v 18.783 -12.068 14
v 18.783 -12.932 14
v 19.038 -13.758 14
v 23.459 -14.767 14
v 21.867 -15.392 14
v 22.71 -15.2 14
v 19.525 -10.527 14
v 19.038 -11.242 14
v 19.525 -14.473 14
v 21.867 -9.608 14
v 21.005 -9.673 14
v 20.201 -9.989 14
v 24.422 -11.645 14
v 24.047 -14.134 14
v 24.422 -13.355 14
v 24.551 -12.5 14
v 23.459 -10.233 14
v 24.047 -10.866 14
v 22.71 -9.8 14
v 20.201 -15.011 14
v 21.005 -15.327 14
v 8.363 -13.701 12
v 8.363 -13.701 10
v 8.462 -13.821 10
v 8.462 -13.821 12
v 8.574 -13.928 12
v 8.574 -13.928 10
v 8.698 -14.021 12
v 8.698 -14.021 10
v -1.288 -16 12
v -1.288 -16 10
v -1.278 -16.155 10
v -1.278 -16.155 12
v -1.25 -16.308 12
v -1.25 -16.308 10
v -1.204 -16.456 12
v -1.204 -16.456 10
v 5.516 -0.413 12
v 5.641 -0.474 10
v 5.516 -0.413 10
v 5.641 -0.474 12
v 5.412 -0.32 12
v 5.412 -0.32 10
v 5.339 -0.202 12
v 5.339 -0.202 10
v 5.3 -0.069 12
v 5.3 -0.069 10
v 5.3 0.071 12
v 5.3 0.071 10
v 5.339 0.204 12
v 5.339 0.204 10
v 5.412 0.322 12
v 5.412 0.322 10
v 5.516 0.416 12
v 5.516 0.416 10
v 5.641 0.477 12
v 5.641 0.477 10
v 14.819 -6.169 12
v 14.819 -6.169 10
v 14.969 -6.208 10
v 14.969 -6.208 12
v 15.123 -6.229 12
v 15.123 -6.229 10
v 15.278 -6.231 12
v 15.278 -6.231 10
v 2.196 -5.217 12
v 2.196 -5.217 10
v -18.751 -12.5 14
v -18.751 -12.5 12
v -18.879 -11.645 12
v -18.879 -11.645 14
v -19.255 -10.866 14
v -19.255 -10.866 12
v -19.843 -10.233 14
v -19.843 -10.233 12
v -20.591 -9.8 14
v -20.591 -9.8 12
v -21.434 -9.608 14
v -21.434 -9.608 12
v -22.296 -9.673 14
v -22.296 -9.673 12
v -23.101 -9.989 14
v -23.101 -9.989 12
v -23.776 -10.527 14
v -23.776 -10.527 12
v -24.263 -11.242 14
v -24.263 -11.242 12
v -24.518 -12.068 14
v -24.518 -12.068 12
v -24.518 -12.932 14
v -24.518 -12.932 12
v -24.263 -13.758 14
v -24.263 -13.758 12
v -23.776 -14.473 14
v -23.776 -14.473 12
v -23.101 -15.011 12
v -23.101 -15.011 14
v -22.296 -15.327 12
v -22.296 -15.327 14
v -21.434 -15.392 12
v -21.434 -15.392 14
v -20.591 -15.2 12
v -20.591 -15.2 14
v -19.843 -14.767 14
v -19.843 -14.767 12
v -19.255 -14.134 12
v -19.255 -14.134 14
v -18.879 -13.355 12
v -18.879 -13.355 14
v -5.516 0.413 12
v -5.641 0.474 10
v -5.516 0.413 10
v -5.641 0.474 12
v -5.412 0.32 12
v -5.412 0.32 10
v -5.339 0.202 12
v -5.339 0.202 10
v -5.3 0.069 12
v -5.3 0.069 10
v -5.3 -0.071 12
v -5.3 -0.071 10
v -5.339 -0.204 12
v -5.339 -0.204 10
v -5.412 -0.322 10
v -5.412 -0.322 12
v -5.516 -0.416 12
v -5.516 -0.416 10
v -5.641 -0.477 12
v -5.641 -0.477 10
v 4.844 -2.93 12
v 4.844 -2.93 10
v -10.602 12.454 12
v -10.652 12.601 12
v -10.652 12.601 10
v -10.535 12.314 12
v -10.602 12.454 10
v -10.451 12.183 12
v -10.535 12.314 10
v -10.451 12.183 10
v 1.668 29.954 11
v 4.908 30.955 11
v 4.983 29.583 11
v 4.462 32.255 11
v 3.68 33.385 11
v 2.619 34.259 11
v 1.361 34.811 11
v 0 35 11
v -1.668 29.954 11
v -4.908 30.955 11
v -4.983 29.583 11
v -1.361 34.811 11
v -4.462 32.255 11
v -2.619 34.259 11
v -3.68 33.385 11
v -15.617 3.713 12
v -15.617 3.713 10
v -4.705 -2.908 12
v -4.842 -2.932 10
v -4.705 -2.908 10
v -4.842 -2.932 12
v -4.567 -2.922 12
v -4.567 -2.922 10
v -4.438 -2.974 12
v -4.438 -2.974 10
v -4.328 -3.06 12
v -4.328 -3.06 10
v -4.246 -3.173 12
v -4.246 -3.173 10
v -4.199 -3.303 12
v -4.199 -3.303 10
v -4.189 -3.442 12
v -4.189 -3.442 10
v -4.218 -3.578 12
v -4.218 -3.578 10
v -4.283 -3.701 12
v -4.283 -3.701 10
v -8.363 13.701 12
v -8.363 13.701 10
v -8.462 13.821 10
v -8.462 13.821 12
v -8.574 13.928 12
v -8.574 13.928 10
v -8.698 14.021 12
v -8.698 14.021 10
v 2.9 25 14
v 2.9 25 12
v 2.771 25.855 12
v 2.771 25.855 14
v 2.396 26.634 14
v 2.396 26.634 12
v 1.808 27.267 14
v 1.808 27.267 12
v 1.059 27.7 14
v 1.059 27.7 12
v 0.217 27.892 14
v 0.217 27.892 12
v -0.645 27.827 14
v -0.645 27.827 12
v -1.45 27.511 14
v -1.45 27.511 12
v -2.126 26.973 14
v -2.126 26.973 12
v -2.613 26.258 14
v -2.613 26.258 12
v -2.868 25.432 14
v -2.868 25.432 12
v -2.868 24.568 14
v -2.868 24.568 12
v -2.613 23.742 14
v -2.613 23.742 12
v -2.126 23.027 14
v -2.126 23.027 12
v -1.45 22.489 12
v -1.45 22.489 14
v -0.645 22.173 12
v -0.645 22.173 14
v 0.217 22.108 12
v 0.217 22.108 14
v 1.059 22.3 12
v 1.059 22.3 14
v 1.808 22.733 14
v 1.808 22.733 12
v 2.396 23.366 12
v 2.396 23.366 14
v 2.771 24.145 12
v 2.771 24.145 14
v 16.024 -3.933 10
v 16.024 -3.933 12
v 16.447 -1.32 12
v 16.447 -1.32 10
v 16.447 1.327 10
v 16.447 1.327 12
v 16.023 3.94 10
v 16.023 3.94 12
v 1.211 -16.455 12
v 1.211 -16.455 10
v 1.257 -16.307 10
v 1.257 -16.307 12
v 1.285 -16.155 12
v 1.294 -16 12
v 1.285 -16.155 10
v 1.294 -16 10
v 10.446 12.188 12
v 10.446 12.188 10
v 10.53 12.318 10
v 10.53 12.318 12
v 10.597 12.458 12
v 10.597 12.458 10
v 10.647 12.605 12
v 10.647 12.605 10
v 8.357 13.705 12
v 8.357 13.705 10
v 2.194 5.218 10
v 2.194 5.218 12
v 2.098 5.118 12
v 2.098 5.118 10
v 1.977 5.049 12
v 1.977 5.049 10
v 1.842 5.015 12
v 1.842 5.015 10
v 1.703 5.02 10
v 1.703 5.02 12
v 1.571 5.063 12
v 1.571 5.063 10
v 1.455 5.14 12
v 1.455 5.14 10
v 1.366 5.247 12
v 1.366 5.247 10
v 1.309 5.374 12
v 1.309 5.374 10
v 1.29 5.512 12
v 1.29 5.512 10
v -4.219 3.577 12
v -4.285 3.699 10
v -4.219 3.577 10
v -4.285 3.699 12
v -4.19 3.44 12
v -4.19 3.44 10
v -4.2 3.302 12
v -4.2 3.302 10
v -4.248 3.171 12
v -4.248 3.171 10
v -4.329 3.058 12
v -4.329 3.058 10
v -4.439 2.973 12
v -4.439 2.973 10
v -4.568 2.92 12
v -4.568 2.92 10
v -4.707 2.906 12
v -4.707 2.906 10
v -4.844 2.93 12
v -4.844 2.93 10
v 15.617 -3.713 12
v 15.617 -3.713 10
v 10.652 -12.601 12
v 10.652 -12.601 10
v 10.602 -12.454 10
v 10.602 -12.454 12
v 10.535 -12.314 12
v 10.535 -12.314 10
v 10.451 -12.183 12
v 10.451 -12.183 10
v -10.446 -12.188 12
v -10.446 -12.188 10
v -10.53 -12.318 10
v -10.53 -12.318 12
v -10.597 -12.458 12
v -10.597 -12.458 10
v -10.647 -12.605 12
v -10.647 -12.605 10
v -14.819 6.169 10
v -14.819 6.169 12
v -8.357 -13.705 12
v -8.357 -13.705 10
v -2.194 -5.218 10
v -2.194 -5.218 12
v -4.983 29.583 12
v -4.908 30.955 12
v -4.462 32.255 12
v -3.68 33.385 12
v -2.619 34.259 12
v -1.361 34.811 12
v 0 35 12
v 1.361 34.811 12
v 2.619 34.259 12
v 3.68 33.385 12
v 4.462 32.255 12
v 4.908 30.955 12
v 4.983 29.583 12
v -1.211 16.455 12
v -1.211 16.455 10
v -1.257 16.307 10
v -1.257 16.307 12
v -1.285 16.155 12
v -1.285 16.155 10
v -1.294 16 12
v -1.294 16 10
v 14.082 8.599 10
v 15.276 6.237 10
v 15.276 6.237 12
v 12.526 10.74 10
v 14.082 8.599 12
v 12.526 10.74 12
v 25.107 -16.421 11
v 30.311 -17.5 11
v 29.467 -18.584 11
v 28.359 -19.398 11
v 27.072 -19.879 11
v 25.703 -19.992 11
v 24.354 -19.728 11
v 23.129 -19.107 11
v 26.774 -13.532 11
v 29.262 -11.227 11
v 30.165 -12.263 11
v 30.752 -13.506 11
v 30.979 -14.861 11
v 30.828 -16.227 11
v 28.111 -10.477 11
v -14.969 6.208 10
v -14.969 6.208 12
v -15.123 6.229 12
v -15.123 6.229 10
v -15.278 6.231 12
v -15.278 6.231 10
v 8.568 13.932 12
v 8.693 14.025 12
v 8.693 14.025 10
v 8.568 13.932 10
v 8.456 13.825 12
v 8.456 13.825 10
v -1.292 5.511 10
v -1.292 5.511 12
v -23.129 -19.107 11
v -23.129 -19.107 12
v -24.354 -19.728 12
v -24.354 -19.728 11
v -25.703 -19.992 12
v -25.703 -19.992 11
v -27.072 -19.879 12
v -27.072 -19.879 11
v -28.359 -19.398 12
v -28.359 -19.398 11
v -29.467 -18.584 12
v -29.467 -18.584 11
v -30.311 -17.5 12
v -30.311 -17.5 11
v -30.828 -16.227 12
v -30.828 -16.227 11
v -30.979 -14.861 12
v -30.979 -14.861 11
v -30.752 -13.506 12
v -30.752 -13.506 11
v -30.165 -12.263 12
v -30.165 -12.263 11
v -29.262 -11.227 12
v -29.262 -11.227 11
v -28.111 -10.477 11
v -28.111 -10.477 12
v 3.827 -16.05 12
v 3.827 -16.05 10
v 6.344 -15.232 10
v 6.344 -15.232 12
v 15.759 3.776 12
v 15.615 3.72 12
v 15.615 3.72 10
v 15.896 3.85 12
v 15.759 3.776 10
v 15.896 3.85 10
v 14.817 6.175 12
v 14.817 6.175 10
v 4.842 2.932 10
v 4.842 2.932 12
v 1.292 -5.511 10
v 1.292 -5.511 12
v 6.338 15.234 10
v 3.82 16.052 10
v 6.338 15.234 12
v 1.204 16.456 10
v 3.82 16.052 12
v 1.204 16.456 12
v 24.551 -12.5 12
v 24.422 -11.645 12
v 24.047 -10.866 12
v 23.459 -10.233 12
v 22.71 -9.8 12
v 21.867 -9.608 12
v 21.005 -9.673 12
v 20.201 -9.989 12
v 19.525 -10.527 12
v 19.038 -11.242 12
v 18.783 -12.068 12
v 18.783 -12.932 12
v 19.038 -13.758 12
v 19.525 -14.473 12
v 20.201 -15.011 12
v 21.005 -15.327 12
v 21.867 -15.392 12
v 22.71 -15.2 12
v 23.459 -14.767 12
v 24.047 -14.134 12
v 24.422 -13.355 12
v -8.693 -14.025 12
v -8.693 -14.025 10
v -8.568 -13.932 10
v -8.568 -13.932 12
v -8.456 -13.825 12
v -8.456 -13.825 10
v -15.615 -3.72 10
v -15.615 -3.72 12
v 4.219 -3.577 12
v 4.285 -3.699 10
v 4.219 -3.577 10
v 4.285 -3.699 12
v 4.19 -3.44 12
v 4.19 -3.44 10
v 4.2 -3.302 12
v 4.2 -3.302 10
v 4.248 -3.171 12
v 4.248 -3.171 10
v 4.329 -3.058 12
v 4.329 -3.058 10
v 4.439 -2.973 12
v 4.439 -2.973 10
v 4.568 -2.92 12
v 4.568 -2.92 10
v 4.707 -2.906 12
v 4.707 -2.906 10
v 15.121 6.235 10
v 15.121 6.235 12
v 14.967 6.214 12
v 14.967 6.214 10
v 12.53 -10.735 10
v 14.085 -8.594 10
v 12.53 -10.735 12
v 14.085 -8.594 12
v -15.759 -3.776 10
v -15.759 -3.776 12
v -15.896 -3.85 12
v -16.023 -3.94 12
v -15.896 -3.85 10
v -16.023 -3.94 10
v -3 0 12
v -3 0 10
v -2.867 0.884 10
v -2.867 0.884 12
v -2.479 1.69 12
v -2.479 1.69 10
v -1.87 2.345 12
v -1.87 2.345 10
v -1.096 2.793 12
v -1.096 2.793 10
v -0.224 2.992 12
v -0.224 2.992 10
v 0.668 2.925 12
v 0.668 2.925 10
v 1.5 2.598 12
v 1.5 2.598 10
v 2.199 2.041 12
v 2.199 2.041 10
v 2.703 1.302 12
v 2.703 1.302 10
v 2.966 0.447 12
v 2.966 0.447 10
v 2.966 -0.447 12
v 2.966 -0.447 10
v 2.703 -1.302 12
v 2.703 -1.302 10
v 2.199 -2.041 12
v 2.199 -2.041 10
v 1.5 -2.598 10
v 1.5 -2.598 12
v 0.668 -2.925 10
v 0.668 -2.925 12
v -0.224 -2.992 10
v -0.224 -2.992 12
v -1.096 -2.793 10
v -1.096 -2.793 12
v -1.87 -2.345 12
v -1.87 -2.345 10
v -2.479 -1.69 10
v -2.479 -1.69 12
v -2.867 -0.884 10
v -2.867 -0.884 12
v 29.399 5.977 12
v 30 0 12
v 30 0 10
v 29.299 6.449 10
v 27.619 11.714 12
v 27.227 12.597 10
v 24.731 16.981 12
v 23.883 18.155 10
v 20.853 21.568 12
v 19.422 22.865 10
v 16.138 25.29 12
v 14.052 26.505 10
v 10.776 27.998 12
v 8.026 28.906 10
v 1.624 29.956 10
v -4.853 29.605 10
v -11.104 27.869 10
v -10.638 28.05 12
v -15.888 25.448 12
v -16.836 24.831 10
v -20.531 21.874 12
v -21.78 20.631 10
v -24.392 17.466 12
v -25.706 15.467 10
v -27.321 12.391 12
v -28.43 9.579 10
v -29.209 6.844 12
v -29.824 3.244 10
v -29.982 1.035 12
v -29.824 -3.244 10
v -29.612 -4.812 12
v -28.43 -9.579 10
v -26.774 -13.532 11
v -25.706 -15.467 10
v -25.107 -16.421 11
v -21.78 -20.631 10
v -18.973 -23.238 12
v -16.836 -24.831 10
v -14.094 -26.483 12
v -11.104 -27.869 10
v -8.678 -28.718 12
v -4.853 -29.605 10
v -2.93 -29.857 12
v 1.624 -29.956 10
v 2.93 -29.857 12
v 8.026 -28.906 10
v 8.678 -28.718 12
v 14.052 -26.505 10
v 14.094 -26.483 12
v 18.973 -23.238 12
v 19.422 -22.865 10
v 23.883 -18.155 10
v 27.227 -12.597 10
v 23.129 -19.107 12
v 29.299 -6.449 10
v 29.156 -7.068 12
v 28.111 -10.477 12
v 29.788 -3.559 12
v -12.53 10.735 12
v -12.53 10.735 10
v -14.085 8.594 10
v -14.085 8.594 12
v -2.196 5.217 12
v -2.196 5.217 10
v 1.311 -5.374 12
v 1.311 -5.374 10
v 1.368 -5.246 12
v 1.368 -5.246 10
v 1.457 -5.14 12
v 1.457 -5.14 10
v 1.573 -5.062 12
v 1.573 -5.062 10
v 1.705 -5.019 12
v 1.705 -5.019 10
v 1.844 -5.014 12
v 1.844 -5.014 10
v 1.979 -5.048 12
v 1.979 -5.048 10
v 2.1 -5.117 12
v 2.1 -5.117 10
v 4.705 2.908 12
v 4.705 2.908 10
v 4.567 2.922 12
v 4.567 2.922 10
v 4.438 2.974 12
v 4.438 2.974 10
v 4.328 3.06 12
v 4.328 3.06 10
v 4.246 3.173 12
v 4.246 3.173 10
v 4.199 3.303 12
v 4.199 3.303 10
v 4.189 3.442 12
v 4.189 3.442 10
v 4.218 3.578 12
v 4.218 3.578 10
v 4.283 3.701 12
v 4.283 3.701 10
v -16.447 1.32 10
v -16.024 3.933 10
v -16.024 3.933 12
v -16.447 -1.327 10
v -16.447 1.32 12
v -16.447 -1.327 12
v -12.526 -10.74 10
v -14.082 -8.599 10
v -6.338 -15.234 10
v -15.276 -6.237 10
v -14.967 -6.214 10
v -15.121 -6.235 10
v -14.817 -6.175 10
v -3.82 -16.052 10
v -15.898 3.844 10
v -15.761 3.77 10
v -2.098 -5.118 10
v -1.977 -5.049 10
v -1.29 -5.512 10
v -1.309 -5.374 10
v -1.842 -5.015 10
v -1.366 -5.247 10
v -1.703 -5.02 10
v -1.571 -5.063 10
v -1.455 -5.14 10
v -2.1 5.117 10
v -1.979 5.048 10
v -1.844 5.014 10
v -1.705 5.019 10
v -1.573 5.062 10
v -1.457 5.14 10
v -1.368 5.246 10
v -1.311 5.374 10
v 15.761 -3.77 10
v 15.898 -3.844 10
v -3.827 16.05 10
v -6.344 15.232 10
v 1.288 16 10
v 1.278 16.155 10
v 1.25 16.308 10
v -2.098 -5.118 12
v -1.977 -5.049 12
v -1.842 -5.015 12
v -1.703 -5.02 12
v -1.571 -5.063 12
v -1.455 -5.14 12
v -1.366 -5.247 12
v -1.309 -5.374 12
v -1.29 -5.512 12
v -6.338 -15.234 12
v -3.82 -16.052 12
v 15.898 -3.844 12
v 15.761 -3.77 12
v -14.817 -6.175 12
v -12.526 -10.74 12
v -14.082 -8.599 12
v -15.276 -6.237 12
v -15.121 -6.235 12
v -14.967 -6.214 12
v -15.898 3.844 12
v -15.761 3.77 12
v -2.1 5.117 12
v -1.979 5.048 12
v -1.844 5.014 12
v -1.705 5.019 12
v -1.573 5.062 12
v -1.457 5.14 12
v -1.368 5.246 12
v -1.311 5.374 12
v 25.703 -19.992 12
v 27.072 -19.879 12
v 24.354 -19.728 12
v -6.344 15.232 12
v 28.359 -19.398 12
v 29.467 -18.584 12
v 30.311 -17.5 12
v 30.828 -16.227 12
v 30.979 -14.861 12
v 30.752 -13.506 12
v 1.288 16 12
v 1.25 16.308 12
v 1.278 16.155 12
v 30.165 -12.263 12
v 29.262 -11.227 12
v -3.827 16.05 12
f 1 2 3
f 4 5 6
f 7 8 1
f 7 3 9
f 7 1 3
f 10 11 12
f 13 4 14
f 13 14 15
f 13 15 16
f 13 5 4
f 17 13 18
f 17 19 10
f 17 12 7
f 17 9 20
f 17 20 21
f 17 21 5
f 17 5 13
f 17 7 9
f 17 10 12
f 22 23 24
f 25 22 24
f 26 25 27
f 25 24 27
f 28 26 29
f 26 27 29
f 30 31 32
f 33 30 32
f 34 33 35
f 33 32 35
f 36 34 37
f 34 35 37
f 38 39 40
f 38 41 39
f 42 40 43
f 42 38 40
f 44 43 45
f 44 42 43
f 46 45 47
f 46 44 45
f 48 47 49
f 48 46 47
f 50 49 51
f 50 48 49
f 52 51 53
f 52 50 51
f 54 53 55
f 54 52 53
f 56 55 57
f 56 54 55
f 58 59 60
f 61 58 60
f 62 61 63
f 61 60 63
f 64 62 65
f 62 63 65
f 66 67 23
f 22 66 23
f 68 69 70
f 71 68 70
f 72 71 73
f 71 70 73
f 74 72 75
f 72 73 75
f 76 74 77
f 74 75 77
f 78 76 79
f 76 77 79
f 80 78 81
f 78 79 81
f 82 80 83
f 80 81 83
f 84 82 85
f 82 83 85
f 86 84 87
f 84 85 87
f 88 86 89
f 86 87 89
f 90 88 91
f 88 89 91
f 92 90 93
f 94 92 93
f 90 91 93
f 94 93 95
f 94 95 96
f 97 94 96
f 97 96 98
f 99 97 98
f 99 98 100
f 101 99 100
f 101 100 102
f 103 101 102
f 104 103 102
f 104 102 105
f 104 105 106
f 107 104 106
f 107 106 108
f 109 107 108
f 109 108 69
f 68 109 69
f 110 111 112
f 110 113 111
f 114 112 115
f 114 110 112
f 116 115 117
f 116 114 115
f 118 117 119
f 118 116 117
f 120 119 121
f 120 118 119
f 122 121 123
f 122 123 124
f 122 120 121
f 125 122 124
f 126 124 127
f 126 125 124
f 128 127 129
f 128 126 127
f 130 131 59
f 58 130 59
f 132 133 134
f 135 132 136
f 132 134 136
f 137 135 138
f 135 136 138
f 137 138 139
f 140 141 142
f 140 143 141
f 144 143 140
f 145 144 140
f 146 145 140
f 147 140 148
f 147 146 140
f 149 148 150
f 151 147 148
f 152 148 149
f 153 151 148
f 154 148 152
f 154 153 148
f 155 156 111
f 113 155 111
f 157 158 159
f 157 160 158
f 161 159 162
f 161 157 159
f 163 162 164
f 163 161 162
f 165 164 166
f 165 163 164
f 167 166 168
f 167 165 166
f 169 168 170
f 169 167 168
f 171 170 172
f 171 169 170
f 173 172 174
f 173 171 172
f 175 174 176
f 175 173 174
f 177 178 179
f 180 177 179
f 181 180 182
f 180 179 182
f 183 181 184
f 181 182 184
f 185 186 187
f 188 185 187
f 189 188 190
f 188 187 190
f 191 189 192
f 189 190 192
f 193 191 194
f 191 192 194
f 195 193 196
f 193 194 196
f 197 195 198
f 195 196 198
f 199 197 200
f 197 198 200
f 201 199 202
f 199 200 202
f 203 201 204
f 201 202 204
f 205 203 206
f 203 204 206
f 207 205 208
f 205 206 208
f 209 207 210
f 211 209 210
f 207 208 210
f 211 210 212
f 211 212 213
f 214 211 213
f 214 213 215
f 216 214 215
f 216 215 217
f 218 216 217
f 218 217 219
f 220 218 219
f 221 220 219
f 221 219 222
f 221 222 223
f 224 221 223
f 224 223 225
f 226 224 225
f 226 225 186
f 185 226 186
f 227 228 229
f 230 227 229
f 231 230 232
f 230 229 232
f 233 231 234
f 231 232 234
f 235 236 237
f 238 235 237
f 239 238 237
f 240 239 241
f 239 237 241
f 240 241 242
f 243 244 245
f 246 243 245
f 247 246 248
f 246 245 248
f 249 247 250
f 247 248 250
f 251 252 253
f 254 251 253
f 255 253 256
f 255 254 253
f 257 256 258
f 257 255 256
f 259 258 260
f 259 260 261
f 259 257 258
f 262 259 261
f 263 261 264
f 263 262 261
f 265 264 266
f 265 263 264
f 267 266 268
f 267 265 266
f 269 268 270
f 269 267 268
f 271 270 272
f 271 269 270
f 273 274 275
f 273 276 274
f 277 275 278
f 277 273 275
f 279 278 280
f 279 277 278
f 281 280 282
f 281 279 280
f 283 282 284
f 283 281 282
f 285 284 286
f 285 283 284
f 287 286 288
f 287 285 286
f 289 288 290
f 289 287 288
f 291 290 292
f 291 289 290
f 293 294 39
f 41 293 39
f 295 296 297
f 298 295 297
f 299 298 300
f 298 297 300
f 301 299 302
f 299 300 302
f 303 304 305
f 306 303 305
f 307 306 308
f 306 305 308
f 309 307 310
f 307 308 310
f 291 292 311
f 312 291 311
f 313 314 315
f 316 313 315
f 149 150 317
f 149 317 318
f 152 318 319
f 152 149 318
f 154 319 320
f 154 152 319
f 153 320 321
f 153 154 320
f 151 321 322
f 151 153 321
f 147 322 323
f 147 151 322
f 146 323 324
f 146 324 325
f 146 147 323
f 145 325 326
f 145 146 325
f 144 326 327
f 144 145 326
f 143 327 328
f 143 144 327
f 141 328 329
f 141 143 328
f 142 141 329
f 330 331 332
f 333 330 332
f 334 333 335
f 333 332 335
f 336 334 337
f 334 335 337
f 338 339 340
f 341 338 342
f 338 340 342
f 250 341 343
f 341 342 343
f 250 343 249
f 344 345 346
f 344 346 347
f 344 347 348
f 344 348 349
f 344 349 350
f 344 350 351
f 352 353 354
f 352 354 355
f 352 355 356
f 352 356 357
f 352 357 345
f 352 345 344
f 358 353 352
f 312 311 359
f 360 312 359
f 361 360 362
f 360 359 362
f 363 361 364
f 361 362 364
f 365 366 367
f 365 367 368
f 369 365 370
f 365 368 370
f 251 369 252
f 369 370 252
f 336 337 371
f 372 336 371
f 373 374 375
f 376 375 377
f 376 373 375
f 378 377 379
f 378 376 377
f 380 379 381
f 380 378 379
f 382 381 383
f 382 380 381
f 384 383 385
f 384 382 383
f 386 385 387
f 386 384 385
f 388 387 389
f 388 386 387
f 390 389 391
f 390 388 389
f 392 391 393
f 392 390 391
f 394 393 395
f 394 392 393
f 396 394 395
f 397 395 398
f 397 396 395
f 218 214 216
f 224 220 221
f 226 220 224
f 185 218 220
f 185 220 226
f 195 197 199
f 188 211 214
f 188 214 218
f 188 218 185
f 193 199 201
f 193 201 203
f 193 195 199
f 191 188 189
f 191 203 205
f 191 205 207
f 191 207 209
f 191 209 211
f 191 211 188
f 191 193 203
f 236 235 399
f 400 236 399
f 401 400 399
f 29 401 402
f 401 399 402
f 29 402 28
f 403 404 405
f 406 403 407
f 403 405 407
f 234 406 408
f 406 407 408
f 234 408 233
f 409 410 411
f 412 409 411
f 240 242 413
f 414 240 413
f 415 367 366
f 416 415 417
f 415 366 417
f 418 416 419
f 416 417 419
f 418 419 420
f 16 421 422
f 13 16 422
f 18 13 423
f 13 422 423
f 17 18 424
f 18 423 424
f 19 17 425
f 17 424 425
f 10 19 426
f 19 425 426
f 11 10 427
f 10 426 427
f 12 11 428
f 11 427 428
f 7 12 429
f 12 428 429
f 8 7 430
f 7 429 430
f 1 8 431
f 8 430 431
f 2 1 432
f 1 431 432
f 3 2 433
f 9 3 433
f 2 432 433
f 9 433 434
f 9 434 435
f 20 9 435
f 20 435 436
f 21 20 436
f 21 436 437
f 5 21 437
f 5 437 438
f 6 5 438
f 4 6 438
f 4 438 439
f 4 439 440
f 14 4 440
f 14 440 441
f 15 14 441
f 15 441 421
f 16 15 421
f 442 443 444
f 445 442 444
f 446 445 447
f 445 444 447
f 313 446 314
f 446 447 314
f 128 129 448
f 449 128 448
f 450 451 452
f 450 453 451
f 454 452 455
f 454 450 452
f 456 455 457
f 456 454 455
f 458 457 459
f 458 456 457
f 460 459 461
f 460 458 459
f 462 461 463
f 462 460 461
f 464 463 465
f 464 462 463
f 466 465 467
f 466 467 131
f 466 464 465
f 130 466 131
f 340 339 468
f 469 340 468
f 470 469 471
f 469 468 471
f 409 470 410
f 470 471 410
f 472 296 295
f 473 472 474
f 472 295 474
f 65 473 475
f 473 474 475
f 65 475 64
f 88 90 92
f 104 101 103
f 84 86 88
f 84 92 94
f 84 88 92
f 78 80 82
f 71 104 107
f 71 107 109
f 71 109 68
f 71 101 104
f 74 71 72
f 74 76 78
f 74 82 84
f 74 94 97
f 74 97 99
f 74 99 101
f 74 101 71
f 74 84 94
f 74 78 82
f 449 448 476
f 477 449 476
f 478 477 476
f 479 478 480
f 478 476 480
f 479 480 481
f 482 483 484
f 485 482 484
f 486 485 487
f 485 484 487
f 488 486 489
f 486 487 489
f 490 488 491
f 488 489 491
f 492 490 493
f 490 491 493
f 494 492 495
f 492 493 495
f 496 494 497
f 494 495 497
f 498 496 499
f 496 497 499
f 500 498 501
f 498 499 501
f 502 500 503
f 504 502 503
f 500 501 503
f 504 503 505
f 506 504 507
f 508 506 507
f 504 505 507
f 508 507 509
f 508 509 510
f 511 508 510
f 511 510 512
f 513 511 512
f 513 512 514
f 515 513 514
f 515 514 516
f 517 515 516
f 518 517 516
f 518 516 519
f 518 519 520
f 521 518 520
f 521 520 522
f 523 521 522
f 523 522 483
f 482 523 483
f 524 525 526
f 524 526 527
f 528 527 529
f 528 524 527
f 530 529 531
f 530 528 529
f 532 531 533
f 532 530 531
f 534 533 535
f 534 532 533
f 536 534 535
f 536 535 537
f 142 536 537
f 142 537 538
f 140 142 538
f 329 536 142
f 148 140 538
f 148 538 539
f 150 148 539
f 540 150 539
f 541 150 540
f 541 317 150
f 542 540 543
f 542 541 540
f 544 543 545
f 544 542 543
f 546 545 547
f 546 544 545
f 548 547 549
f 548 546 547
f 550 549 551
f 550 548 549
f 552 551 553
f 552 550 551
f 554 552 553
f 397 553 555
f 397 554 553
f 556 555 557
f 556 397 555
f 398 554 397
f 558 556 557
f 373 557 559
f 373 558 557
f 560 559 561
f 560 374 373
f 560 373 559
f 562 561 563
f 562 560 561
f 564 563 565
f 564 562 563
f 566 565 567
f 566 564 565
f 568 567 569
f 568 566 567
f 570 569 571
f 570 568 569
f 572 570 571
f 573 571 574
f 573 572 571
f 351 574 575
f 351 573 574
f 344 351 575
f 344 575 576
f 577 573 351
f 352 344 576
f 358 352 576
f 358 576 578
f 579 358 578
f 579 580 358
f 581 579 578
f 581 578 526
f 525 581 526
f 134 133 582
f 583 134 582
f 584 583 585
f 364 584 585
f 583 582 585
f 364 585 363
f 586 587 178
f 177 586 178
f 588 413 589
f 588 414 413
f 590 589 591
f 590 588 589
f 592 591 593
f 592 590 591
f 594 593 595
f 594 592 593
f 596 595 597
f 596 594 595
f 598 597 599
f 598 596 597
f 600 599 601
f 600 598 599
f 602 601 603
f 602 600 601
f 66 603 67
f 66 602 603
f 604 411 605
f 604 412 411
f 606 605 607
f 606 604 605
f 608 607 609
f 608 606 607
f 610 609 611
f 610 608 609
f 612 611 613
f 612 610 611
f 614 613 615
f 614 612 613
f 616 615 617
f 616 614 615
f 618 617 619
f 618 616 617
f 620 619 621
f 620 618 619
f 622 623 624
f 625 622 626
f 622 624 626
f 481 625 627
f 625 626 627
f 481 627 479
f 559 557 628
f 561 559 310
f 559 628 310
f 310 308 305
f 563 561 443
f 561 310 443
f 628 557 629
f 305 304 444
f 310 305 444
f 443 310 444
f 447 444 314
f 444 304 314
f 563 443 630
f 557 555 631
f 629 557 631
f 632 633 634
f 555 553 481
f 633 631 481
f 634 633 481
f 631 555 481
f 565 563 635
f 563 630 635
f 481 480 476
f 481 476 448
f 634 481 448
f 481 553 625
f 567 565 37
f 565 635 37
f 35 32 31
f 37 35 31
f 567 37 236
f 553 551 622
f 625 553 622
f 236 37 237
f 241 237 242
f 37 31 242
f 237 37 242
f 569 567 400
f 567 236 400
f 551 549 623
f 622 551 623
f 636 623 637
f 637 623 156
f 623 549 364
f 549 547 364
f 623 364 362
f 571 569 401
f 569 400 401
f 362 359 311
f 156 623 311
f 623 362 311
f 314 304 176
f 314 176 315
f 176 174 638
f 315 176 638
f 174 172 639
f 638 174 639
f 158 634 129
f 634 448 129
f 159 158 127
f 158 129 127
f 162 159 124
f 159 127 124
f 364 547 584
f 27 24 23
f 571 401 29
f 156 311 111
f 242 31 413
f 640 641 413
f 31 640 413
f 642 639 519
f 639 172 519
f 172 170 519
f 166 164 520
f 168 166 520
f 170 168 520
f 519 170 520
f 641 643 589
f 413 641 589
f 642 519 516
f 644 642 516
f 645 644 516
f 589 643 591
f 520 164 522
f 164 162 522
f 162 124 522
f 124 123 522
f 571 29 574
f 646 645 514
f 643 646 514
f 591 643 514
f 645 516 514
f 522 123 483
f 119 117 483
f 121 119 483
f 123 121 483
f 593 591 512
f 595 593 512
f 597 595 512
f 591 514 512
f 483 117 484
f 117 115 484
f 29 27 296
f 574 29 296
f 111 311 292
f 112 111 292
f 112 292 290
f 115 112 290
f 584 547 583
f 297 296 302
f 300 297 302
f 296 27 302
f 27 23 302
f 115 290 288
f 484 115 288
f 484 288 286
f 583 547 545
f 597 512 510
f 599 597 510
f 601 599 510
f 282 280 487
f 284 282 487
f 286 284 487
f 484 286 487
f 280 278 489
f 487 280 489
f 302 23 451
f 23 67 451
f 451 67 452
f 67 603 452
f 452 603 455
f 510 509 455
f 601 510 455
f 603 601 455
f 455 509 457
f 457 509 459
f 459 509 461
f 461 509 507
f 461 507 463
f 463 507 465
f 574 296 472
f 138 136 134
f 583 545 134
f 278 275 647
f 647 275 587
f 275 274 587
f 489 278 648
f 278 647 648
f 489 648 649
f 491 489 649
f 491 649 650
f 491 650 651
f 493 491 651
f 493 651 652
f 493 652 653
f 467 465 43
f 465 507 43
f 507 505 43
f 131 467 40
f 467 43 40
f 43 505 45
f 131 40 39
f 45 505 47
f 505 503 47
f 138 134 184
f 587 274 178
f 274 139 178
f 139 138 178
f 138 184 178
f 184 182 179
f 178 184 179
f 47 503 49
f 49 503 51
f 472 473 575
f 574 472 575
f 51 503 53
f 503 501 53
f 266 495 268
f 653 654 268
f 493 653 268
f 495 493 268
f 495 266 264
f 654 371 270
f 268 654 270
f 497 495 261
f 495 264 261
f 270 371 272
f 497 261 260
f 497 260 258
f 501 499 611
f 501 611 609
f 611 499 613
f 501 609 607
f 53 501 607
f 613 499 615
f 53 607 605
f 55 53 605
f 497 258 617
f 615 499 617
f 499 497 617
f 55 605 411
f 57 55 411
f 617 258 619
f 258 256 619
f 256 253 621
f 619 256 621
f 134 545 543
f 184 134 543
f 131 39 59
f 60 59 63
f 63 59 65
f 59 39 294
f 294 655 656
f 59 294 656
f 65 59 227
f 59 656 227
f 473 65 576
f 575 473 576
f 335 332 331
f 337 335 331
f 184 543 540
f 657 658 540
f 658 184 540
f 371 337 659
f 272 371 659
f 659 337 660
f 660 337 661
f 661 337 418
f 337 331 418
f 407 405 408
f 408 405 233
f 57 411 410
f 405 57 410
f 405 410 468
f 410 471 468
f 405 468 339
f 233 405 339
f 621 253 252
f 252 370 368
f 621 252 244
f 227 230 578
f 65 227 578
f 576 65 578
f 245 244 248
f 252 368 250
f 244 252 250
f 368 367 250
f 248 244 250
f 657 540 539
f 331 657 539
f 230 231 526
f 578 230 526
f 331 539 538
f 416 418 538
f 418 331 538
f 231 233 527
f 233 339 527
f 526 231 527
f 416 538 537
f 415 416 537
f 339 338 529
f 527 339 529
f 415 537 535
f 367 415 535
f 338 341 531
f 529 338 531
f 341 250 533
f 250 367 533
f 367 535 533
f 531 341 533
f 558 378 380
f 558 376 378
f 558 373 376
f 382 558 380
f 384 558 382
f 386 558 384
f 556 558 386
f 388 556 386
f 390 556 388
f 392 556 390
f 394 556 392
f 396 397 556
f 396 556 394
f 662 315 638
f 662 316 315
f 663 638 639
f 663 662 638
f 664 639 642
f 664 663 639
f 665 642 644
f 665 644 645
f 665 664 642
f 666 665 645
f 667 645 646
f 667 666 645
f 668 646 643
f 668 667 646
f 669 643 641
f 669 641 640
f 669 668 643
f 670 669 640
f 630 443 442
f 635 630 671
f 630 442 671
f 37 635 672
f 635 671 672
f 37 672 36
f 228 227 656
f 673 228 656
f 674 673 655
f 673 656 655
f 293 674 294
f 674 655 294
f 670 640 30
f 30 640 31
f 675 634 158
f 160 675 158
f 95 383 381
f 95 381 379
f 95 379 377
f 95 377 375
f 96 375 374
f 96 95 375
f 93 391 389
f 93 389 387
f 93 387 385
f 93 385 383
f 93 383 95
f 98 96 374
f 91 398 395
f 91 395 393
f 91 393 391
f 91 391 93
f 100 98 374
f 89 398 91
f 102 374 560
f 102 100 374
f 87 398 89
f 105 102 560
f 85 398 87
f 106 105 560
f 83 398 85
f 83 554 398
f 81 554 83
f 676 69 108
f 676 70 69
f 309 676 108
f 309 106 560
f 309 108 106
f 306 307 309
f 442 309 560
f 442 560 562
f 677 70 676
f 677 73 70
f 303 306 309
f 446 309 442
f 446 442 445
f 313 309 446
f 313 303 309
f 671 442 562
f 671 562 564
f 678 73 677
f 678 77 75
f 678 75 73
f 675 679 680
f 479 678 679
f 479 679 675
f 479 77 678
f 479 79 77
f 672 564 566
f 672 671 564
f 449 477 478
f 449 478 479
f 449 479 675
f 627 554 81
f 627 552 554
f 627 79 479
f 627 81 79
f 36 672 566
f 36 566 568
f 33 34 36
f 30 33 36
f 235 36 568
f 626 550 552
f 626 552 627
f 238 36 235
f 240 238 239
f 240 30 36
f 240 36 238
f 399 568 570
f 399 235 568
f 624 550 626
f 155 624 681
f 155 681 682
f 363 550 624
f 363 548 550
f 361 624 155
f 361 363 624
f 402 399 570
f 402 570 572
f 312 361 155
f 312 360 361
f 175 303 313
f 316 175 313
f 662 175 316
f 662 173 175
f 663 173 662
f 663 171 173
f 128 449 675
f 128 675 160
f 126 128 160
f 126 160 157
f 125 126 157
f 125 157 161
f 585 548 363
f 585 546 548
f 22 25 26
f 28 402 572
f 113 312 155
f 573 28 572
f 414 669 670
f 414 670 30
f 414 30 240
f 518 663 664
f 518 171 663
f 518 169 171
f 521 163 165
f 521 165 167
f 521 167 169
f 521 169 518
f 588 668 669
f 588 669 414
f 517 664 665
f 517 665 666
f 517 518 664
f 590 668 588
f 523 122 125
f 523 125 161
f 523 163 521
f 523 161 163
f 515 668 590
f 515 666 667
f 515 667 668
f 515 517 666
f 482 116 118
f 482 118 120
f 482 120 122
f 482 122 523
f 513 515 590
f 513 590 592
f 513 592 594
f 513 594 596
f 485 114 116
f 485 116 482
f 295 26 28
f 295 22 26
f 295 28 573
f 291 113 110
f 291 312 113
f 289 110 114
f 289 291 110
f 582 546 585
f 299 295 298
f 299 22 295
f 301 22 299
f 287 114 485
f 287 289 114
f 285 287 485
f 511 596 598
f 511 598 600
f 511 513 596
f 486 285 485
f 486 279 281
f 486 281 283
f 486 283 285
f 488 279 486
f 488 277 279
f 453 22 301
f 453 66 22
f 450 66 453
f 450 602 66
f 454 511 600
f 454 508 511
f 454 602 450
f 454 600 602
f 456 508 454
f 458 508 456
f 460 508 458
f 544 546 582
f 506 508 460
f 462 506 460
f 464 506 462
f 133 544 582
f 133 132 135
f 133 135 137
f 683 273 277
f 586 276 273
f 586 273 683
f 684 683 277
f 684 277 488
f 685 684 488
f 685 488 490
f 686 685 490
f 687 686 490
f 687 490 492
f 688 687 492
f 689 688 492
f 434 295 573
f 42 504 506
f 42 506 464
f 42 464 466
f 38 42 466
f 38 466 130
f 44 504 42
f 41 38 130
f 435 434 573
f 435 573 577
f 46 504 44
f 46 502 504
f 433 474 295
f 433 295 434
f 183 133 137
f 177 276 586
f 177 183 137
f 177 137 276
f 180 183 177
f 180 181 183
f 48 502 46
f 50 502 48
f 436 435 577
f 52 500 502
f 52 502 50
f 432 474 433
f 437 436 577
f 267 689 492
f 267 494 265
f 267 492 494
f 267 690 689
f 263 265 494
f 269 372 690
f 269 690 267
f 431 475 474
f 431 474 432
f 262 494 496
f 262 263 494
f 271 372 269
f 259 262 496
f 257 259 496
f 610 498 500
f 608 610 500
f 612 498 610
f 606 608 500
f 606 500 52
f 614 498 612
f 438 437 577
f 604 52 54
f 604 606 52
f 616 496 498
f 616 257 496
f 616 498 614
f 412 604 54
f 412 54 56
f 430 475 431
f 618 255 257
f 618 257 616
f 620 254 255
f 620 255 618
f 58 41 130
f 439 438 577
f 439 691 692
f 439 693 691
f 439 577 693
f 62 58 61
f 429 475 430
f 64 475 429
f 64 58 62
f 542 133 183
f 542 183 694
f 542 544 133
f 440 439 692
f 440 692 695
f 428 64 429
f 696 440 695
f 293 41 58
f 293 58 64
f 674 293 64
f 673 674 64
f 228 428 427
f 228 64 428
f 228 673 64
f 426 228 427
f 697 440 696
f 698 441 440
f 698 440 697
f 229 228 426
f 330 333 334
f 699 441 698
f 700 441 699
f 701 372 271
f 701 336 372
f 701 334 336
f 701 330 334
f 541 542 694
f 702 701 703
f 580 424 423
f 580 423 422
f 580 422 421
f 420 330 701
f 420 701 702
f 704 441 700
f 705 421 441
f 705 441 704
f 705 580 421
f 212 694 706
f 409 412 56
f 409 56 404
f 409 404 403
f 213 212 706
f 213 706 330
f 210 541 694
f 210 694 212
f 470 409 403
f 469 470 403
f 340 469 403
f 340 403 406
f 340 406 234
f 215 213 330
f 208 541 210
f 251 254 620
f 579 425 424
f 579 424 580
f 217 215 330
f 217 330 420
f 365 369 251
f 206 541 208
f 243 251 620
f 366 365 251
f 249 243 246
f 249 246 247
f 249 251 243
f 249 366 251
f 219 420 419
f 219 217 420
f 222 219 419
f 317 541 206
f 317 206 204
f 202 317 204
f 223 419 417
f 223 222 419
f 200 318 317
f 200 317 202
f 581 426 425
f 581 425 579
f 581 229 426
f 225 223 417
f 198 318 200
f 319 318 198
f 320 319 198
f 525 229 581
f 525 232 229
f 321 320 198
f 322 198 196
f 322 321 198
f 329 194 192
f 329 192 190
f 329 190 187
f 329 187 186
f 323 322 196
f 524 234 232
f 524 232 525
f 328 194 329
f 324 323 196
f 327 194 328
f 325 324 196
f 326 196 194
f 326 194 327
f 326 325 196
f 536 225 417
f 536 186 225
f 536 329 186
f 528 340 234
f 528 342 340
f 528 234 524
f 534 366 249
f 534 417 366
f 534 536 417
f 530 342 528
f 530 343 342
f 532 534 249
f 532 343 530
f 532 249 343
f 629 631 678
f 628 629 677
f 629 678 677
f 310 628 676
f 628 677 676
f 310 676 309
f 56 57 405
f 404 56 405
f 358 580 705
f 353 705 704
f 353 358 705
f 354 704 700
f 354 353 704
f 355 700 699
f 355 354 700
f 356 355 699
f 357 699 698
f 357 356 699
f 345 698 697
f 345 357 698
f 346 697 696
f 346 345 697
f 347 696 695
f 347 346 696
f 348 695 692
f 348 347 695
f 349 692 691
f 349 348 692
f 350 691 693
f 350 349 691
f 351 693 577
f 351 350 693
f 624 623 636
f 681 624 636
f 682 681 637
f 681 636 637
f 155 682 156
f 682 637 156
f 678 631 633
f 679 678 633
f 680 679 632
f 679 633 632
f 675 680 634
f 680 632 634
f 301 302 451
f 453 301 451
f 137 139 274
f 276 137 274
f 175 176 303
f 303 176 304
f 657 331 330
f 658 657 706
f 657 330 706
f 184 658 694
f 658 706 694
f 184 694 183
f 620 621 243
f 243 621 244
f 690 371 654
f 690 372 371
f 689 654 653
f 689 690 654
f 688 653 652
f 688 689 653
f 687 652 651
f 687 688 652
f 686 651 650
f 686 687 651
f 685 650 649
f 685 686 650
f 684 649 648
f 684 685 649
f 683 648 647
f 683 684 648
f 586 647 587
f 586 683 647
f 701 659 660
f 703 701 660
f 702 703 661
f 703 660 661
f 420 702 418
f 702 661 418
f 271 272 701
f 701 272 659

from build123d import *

# Parameters (mm, degrees)
BOSS_EXTRUDE1_DEPTH    = 2
BOSS_EXTRUDE1_2_DEPTH  = 2
BOSS_EXTRUDE1_3_DEPTH  = 2
BOSS_EXTRUDE1_4_DEPTH  = 2
BOSS_EXTRUDE1_5_DEPTH  = 2
BOSS_EXTRUDE1_6_DEPTH  = 2
BOSS_EXTRUDE1_7_DEPTH  = 2
BOSS_EXTRUDE1_8_DEPTH  = 2
BOSS_EXTRUDE1_9_DEPTH  = 2
BOSS_EXTRUDE1_10_DEPTH = 2
SKETCH3_R              = 30
SKETCH3_R_2            = 16.5
BOSS_EXTRUDE2_DEPTH    = 2
SKETCH4_R              = 2.9
BOSS_EXTRUDE3_DEPTH    = 2
SKETCH6_R              = 5
BOSS_EXTRUDE4_DEPTH    = 1
SKETCH13_R             = 4.177329345
BOSS_EXTRUDE6_DEPTH    = 2
FILLET2_R              = 0.5
SKETCH14_R             = 3
CUT_EXTRUDE1_DEPTH     = 20


with BuildPart() as part:
    # Sketch2 → Boss-Extrude1 (new body)
    with BuildSketch(Plane.XY.offset(10)):
        with BuildLine():
            Line((8.357492916, 13.704694326), (1.290071734, 3.973134201))
            Line((1.290071734, 3.973134201), (1.290510646, 1.776982243))
            Line((1.290510646, 1.776982243), (3.379039645, 2.45604795))
            Line((3.379039645, 2.45604795), (10.446460828, 12.187608075))
            ThreePointArc((10.446460828, 12.187608075), (10.160519997, 13.990635156), (8.357492916, 13.704694326))
        make_face()
    extrude(amount=BOSS_EXTRUDE1_DEPTH)


with BuildPart() as body_2:
    # Sketch2 → Boss-Extrude1 2 (new body)
    with BuildSketch(Plane.XY.offset(10)):
        with BuildLine():
            Line((1.290071734, 3.973134201), (1.287668054, 16.000257666))
            ThreePointArc((1.287668054, 16.000257666), (-0.003455665, 17.290865413), (-1.294063412, 15.999741695))
            Line((-1.294063412, 15.999741695), (-1.291659732, 3.972618229))
            Line((-1.291659732, 3.972618229), (-0.000438912, 2.196151958))
            Line((-0.000438912, 2.196151958), (1.290071734, 3.973134201))
        make_face()
    extrude(amount=BOSS_EXTRUDE1_2_DEPTH)


with BuildPart() as body_3:
    # Sketch2 → Boss-Extrude1 3 (new body)
    with BuildSketch(Plane.XY.offset(10)):
        with BuildLine():
            Line((-1.29122082, 1.776466271), (-1.291659732, 3.972618229))
            Line((-1.291659732, 3.972618229), (-8.362970151, 13.701352658))
            ThreePointArc((-8.362970151, 13.701352658), (-10.166111381, 13.986572778), (-10.451331501, 12.183431547))
            Line((-10.451331501, 12.183431547), (-3.380021082, 2.454697118))
            Line((-3.380021082, 2.454697118), (-1.29122082, 1.776466271))
        make_face()
    extrude(amount=BOSS_EXTRUDE1_3_DEPTH)


with BuildPart() as body_4:
    # Sketch2 → Boss-Extrude1 4 (new body)
    with BuildSketch(Plane.XY.offset(10)):
        with BuildLine():
            Line((-2.088800262, 0.678230847), (-3.380021082, 2.454697118))
            Line((-3.380021082, 2.454697118), (-14.819238004, 6.168996626))
            ThreePointArc((-14.819238004, 6.168996626), (-16.445658083, 5.339884727), (-15.616546184, 3.713464648))
            Line((-15.616546184, 3.713464648), (-4.177329262, -0.00083486))
            Line((-4.177329262, -0.00083486), (-2.088800262, 0.678230847))
        make_face()
    extrude(amount=BOSS_EXTRUDE1_4_DEPTH)


with BuildPart() as body_5:
    # Sketch2 → Boss-Extrude1 5 (new body)
    with BuildSketch(Plane.XY.offset(10)):
        with BuildLine():
            Line((-2.088529, -0.679065707), (-4.177329262, -0.00083486))
            Line((-4.177329262, -0.00083486), (-15.615060628, -3.71970644))
            ThreePointArc((-15.615060628, -3.71970644), (-16.443522365, -5.346457793), (-14.816771011, -6.17491953))
            Line((-14.816771011, -6.17491953), (-3.379039645, -2.45604795))
            Line((-3.379039645, -2.45604795), (-2.088529, -0.679065707))
        make_face()
    extrude(amount=BOSS_EXTRUDE1_5_DEPTH)


with BuildPart() as body_6:
    # Sketch2 → Boss-Extrude1 6 (new body)
    with BuildSketch(Plane.XY.offset(10)):
        with BuildLine():
            Line((-1.290510646, -1.776982243), (-3.379039645, -2.45604795))
            Line((-3.379039645, -2.45604795), (-10.446460828, -12.187608075))
            ThreePointArc((-10.446460828, -12.187608075), (-10.160519997, -13.990635156), (-8.357492916, -13.704694326))
            Line((-8.357492916, -13.704694326), (-1.290071734, -3.973134201))
            Line((-1.290071734, -3.973134201), (-1.290510646, -1.776982243))
        make_face()
    extrude(amount=BOSS_EXTRUDE1_6_DEPTH)


with BuildPart() as body_7:
    # Sketch2 → Boss-Extrude1 7 (new body)
    with BuildSketch(Plane.XY.offset(10)):
        with BuildLine():
            Line((1.294063412, -15.999741695), (1.291659732, -3.972618229))
            Line((1.291659732, -3.972618229), (0.000438912, -2.196151958))
            Line((0.000438912, -2.196151958), (-1.290071734, -3.973134201))
            Line((-1.290071734, -3.973134201), (-1.287668054, -16.000257666))
            ThreePointArc((-1.287668054, -16.000257666), (0.003455665, -17.290865413), (1.294063412, -15.999741695))
        make_face()
    extrude(amount=BOSS_EXTRUDE1_7_DEPTH)


with BuildPart() as body_8:
    # Sketch2 → Boss-Extrude1 8 (new body)
    with BuildSketch(Plane.XY.offset(10)):
        with BuildLine():
            Line((10.451331501, -12.183431547), (3.380021082, -2.454697118))
            Line((3.380021082, -2.454697118), (1.29122082, -1.776466271))
            Line((1.29122082, -1.776466271), (1.291659732, -3.972618229))
            Line((1.291659732, -3.972618229), (8.362970151, -13.701352658))
            ThreePointArc((8.362970151, -13.701352658), (10.166111381, -13.986572778), (10.451331501, -12.183431547))
        make_face()
    extrude(amount=BOSS_EXTRUDE1_8_DEPTH)


with BuildPart() as body_9:
    # Sketch2 → Boss-Extrude1 9 (new body)
    with BuildSketch(Plane.XY.offset(10)):
        with BuildLine():
            Line((15.616546184, -3.713464648), (4.177329262, 0.00083486))
            Line((4.177329262, 0.00083486), (2.088800262, -0.678230847))
            Line((2.088800262, -0.678230847), (3.380021082, -2.454697118))
            Line((3.380021082, -2.454697118), (14.819238004, -6.168996626))
            ThreePointArc((14.819238004, -6.168996626), (16.445658083, -5.339884727), (15.616546184, -3.713464648))
        make_face()
    extrude(amount=BOSS_EXTRUDE1_9_DEPTH)


with BuildPart() as body_10:
    # Sketch2 → Boss-Extrude1 10 (new body)
    with BuildSketch(Plane.XY.offset(10)):
        with BuildLine():
            Line((14.816771011, 6.17491953), (3.379039645, 2.45604795))
            Line((3.379039645, 2.45604795), (2.088529, 0.679065707))
            Line((2.088529, 0.679065707), (4.177329262, 0.00083486))
            Line((4.177329262, 0.00083486), (15.615060628, 3.71970644))
            ThreePointArc((15.615060628, 3.71970644), (16.443522365, 5.346457793), (14.816771011, 6.17491953))
        make_face()
    extrude(amount=BOSS_EXTRUDE1_10_DEPTH)


with BuildPart() as body_11:
    # Sketch3 → Boss-Extrude2 (new body)
    with BuildSketch(Plane.XY.offset(12)):
        Circle(SKETCH3_R)
        Circle(SKETCH3_R_2, mode=Mode.SUBTRACT)
    extrude(amount=-BOSS_EXTRUDE2_DEPTH)

    # Sketch4 → Boss-Extrude3 (add)
    with BuildSketch(Plane.XY.offset(12)):
        with Locations((0, 25)):
            Circle(SKETCH4_R)
        with Locations((21.650635095, -12.5)):
            Circle(SKETCH4_R)
        with Locations((-21.650635095, -12.5)):
            Circle(SKETCH4_R)
    extrude(amount=BOSS_EXTRUDE3_DEPTH)

    # Sketch6 → Boss-Extrude4 (add)
    with BuildSketch(Plane(origin=(0, 0, 11), x_dir=(-1, 0, 0), z_dir=(0, 0, -1))):
        with Locations((0, 30)):
            Circle(SKETCH6_R)
        with Locations((25.980762114, -15)):
            Circle(SKETCH6_R)
        with Locations((-25.980762114, -15)):
            Circle(SKETCH6_R)
    extrude(amount=-BOSS_EXTRUDE4_DEPTH)


    add(part.part)  # Boss-Extrude6 merges part

    add(body_3.part)  # Boss-Extrude6 merges body 3

    add(body_5.part)  # Boss-Extrude6 merges body 5

    add(body_7.part)  # Boss-Extrude6 merges body 7

    add(body_9.part)  # Boss-Extrude6 merges body 9

    add(body_2.part)  # Boss-Extrude6 merges body 2

    add(body_4.part)  # Boss-Extrude6 merges body 4

    add(body_6.part)  # Boss-Extrude6 merges body 6

    add(body_8.part)  # Boss-Extrude6 merges body 8

    add(body_10.part)  # Boss-Extrude6 merges body 10
    # Sketch13 → Boss-Extrude6 (add)
    with BuildSketch(Plane(origin=(0, 0, 10), x_dir=(-1, 0, 0), z_dir=(0, 0, -1))):
        Circle(SKETCH13_R)
    extrude(amount=-BOSS_EXTRUDE6_DEPTH)

    # Fillet2
    fillet2_edges = [body_11.edges().sort_by_distance(p)[0] for p in [
        (-1.290071734, -3.973134201, 11),
        (1.291659732, -3.972618229, 11),
        (3.380021082, -2.454697118, 11),
        (4.177329262, 0.00083486, 11),
        (3.379039645, 2.45604795, 11),
        (1.290071734, 3.973134201, 11),
        (-1.291659732, 3.972618229, 11),
        (-3.380021082, 2.454697118, 11),
        (-4.177329262, -0.00083486, 11),
        (-3.379039645, -2.45604795, 11),
    ]]
    fillet(fillet2_edges, radius=FILLET2_R)

    # Sketch14 → Cut-Extrude1 (cut)
    with BuildSketch(Plane(origin=(0, 0, 10), x_dir=(-1, 0, 0), z_dir=(0, 0, -1))):
        Circle(SKETCH14_R)
    extrude(amount=-CUT_EXTRUDE1_DEPTH, mode=Mode.SUBTRACT)


solid = body_11.part
